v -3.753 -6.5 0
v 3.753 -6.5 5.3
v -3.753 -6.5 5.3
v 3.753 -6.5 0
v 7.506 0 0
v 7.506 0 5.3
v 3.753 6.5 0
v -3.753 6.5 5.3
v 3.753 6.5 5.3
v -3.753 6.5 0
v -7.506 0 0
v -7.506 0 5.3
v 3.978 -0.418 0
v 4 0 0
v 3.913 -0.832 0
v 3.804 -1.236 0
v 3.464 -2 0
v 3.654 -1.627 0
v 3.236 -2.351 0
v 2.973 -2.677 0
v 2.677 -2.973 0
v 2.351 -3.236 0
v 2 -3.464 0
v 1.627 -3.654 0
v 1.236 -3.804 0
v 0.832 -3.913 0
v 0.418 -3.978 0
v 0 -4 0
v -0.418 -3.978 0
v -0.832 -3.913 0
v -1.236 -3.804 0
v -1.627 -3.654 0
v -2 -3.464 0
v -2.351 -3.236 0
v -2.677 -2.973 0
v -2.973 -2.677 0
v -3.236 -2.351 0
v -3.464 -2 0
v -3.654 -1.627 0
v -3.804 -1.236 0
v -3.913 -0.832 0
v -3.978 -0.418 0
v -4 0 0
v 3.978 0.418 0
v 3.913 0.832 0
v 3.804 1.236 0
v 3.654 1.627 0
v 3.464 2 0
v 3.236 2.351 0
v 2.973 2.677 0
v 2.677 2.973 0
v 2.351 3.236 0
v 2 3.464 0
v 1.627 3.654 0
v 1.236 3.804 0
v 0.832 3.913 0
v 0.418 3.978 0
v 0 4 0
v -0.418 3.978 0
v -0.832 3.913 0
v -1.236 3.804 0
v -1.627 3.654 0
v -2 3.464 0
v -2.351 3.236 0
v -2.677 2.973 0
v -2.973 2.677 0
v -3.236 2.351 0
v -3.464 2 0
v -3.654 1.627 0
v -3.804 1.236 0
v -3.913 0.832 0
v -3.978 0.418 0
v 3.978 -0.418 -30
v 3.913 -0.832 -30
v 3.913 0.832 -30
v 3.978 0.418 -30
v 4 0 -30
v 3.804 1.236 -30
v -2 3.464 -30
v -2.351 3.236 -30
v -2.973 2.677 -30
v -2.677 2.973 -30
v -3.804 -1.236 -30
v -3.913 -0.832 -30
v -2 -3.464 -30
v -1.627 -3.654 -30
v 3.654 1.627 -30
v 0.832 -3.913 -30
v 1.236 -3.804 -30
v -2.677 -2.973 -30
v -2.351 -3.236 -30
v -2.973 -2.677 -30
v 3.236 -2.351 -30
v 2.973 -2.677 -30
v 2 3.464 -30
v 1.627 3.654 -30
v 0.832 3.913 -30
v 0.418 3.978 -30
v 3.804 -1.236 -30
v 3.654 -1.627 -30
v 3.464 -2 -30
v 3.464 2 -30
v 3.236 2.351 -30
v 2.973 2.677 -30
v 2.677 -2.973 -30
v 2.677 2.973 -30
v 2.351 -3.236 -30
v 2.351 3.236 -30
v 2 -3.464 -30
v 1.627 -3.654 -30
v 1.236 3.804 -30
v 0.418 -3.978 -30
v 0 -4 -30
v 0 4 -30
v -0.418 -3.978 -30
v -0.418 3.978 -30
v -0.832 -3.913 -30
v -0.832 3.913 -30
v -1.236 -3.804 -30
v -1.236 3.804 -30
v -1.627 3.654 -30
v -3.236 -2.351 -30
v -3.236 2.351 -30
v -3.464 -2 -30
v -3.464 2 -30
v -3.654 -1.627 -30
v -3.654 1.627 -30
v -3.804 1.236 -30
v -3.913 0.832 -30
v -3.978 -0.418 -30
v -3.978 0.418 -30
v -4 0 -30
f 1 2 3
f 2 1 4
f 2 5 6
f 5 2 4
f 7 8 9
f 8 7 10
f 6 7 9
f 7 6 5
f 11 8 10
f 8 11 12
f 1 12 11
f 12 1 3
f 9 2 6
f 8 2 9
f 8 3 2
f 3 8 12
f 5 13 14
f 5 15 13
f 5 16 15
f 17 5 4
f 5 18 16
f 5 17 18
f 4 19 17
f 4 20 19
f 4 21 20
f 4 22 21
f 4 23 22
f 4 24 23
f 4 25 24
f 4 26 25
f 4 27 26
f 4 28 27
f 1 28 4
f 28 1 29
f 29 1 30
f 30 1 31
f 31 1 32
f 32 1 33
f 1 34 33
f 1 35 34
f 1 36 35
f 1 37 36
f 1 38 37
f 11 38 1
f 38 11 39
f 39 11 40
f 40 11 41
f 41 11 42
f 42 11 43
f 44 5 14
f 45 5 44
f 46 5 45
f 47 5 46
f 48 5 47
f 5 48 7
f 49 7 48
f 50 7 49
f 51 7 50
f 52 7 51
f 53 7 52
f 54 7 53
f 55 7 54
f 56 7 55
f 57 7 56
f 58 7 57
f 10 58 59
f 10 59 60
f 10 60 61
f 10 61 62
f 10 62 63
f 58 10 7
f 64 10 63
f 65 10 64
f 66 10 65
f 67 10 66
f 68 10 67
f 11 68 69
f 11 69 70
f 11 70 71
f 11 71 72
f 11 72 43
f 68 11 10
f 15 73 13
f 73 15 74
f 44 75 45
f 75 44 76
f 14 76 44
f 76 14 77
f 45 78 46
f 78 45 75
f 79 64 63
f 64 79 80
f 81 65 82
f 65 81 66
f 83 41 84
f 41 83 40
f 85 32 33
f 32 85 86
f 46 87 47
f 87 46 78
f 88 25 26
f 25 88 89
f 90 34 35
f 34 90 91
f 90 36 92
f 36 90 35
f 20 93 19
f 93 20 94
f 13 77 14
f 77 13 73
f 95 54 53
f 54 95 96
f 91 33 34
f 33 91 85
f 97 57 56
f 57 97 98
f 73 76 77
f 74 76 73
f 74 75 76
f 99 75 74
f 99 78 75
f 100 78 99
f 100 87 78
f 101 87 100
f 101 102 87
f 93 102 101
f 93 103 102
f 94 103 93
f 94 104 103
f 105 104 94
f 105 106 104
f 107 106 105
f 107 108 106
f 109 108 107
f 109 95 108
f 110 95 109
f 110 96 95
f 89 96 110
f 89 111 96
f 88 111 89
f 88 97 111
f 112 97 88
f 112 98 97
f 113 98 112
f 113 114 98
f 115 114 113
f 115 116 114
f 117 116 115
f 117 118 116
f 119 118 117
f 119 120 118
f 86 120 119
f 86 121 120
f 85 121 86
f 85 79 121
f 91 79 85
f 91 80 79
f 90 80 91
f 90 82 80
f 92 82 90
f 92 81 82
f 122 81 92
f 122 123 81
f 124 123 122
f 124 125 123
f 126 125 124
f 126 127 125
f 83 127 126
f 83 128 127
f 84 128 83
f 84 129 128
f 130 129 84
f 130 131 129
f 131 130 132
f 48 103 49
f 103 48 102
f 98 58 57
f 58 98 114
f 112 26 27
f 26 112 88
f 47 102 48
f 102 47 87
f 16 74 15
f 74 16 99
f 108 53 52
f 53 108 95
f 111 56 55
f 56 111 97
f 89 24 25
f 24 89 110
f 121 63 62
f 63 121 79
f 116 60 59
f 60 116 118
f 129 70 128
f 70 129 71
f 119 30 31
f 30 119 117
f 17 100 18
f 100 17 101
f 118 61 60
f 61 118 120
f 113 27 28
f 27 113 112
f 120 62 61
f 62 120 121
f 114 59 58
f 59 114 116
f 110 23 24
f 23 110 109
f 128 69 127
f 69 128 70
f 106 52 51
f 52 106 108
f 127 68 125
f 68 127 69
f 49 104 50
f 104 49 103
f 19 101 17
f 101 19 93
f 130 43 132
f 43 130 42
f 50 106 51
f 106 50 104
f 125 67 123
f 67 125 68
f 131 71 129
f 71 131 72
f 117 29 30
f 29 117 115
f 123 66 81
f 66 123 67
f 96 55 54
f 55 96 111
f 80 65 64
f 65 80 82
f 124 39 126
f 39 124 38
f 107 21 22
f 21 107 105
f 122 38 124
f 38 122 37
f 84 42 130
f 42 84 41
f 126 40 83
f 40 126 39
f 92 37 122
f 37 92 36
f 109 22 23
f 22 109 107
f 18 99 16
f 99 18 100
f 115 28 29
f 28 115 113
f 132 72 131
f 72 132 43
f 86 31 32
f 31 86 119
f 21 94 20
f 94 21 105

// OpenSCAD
$fn = 60;

// Dimensions
shank_dia = 8;
shank_len = 30;
head_af = 13;       // Across-flats distance
head_height = 5.3;

// Hexagon radius (distance from center to vertex)
head_radius = (head_af / 2) / cos(30);

// Hexagonal Head (z >= 0)
translate([0, 0, 0])
    cylinder(r = head_radius, h = head_height, $fn = 6);

// Shank (z <= 0)
translate([0, 0, -shank_len])
    cylinder(d = shank_dia, h = shank_len);
